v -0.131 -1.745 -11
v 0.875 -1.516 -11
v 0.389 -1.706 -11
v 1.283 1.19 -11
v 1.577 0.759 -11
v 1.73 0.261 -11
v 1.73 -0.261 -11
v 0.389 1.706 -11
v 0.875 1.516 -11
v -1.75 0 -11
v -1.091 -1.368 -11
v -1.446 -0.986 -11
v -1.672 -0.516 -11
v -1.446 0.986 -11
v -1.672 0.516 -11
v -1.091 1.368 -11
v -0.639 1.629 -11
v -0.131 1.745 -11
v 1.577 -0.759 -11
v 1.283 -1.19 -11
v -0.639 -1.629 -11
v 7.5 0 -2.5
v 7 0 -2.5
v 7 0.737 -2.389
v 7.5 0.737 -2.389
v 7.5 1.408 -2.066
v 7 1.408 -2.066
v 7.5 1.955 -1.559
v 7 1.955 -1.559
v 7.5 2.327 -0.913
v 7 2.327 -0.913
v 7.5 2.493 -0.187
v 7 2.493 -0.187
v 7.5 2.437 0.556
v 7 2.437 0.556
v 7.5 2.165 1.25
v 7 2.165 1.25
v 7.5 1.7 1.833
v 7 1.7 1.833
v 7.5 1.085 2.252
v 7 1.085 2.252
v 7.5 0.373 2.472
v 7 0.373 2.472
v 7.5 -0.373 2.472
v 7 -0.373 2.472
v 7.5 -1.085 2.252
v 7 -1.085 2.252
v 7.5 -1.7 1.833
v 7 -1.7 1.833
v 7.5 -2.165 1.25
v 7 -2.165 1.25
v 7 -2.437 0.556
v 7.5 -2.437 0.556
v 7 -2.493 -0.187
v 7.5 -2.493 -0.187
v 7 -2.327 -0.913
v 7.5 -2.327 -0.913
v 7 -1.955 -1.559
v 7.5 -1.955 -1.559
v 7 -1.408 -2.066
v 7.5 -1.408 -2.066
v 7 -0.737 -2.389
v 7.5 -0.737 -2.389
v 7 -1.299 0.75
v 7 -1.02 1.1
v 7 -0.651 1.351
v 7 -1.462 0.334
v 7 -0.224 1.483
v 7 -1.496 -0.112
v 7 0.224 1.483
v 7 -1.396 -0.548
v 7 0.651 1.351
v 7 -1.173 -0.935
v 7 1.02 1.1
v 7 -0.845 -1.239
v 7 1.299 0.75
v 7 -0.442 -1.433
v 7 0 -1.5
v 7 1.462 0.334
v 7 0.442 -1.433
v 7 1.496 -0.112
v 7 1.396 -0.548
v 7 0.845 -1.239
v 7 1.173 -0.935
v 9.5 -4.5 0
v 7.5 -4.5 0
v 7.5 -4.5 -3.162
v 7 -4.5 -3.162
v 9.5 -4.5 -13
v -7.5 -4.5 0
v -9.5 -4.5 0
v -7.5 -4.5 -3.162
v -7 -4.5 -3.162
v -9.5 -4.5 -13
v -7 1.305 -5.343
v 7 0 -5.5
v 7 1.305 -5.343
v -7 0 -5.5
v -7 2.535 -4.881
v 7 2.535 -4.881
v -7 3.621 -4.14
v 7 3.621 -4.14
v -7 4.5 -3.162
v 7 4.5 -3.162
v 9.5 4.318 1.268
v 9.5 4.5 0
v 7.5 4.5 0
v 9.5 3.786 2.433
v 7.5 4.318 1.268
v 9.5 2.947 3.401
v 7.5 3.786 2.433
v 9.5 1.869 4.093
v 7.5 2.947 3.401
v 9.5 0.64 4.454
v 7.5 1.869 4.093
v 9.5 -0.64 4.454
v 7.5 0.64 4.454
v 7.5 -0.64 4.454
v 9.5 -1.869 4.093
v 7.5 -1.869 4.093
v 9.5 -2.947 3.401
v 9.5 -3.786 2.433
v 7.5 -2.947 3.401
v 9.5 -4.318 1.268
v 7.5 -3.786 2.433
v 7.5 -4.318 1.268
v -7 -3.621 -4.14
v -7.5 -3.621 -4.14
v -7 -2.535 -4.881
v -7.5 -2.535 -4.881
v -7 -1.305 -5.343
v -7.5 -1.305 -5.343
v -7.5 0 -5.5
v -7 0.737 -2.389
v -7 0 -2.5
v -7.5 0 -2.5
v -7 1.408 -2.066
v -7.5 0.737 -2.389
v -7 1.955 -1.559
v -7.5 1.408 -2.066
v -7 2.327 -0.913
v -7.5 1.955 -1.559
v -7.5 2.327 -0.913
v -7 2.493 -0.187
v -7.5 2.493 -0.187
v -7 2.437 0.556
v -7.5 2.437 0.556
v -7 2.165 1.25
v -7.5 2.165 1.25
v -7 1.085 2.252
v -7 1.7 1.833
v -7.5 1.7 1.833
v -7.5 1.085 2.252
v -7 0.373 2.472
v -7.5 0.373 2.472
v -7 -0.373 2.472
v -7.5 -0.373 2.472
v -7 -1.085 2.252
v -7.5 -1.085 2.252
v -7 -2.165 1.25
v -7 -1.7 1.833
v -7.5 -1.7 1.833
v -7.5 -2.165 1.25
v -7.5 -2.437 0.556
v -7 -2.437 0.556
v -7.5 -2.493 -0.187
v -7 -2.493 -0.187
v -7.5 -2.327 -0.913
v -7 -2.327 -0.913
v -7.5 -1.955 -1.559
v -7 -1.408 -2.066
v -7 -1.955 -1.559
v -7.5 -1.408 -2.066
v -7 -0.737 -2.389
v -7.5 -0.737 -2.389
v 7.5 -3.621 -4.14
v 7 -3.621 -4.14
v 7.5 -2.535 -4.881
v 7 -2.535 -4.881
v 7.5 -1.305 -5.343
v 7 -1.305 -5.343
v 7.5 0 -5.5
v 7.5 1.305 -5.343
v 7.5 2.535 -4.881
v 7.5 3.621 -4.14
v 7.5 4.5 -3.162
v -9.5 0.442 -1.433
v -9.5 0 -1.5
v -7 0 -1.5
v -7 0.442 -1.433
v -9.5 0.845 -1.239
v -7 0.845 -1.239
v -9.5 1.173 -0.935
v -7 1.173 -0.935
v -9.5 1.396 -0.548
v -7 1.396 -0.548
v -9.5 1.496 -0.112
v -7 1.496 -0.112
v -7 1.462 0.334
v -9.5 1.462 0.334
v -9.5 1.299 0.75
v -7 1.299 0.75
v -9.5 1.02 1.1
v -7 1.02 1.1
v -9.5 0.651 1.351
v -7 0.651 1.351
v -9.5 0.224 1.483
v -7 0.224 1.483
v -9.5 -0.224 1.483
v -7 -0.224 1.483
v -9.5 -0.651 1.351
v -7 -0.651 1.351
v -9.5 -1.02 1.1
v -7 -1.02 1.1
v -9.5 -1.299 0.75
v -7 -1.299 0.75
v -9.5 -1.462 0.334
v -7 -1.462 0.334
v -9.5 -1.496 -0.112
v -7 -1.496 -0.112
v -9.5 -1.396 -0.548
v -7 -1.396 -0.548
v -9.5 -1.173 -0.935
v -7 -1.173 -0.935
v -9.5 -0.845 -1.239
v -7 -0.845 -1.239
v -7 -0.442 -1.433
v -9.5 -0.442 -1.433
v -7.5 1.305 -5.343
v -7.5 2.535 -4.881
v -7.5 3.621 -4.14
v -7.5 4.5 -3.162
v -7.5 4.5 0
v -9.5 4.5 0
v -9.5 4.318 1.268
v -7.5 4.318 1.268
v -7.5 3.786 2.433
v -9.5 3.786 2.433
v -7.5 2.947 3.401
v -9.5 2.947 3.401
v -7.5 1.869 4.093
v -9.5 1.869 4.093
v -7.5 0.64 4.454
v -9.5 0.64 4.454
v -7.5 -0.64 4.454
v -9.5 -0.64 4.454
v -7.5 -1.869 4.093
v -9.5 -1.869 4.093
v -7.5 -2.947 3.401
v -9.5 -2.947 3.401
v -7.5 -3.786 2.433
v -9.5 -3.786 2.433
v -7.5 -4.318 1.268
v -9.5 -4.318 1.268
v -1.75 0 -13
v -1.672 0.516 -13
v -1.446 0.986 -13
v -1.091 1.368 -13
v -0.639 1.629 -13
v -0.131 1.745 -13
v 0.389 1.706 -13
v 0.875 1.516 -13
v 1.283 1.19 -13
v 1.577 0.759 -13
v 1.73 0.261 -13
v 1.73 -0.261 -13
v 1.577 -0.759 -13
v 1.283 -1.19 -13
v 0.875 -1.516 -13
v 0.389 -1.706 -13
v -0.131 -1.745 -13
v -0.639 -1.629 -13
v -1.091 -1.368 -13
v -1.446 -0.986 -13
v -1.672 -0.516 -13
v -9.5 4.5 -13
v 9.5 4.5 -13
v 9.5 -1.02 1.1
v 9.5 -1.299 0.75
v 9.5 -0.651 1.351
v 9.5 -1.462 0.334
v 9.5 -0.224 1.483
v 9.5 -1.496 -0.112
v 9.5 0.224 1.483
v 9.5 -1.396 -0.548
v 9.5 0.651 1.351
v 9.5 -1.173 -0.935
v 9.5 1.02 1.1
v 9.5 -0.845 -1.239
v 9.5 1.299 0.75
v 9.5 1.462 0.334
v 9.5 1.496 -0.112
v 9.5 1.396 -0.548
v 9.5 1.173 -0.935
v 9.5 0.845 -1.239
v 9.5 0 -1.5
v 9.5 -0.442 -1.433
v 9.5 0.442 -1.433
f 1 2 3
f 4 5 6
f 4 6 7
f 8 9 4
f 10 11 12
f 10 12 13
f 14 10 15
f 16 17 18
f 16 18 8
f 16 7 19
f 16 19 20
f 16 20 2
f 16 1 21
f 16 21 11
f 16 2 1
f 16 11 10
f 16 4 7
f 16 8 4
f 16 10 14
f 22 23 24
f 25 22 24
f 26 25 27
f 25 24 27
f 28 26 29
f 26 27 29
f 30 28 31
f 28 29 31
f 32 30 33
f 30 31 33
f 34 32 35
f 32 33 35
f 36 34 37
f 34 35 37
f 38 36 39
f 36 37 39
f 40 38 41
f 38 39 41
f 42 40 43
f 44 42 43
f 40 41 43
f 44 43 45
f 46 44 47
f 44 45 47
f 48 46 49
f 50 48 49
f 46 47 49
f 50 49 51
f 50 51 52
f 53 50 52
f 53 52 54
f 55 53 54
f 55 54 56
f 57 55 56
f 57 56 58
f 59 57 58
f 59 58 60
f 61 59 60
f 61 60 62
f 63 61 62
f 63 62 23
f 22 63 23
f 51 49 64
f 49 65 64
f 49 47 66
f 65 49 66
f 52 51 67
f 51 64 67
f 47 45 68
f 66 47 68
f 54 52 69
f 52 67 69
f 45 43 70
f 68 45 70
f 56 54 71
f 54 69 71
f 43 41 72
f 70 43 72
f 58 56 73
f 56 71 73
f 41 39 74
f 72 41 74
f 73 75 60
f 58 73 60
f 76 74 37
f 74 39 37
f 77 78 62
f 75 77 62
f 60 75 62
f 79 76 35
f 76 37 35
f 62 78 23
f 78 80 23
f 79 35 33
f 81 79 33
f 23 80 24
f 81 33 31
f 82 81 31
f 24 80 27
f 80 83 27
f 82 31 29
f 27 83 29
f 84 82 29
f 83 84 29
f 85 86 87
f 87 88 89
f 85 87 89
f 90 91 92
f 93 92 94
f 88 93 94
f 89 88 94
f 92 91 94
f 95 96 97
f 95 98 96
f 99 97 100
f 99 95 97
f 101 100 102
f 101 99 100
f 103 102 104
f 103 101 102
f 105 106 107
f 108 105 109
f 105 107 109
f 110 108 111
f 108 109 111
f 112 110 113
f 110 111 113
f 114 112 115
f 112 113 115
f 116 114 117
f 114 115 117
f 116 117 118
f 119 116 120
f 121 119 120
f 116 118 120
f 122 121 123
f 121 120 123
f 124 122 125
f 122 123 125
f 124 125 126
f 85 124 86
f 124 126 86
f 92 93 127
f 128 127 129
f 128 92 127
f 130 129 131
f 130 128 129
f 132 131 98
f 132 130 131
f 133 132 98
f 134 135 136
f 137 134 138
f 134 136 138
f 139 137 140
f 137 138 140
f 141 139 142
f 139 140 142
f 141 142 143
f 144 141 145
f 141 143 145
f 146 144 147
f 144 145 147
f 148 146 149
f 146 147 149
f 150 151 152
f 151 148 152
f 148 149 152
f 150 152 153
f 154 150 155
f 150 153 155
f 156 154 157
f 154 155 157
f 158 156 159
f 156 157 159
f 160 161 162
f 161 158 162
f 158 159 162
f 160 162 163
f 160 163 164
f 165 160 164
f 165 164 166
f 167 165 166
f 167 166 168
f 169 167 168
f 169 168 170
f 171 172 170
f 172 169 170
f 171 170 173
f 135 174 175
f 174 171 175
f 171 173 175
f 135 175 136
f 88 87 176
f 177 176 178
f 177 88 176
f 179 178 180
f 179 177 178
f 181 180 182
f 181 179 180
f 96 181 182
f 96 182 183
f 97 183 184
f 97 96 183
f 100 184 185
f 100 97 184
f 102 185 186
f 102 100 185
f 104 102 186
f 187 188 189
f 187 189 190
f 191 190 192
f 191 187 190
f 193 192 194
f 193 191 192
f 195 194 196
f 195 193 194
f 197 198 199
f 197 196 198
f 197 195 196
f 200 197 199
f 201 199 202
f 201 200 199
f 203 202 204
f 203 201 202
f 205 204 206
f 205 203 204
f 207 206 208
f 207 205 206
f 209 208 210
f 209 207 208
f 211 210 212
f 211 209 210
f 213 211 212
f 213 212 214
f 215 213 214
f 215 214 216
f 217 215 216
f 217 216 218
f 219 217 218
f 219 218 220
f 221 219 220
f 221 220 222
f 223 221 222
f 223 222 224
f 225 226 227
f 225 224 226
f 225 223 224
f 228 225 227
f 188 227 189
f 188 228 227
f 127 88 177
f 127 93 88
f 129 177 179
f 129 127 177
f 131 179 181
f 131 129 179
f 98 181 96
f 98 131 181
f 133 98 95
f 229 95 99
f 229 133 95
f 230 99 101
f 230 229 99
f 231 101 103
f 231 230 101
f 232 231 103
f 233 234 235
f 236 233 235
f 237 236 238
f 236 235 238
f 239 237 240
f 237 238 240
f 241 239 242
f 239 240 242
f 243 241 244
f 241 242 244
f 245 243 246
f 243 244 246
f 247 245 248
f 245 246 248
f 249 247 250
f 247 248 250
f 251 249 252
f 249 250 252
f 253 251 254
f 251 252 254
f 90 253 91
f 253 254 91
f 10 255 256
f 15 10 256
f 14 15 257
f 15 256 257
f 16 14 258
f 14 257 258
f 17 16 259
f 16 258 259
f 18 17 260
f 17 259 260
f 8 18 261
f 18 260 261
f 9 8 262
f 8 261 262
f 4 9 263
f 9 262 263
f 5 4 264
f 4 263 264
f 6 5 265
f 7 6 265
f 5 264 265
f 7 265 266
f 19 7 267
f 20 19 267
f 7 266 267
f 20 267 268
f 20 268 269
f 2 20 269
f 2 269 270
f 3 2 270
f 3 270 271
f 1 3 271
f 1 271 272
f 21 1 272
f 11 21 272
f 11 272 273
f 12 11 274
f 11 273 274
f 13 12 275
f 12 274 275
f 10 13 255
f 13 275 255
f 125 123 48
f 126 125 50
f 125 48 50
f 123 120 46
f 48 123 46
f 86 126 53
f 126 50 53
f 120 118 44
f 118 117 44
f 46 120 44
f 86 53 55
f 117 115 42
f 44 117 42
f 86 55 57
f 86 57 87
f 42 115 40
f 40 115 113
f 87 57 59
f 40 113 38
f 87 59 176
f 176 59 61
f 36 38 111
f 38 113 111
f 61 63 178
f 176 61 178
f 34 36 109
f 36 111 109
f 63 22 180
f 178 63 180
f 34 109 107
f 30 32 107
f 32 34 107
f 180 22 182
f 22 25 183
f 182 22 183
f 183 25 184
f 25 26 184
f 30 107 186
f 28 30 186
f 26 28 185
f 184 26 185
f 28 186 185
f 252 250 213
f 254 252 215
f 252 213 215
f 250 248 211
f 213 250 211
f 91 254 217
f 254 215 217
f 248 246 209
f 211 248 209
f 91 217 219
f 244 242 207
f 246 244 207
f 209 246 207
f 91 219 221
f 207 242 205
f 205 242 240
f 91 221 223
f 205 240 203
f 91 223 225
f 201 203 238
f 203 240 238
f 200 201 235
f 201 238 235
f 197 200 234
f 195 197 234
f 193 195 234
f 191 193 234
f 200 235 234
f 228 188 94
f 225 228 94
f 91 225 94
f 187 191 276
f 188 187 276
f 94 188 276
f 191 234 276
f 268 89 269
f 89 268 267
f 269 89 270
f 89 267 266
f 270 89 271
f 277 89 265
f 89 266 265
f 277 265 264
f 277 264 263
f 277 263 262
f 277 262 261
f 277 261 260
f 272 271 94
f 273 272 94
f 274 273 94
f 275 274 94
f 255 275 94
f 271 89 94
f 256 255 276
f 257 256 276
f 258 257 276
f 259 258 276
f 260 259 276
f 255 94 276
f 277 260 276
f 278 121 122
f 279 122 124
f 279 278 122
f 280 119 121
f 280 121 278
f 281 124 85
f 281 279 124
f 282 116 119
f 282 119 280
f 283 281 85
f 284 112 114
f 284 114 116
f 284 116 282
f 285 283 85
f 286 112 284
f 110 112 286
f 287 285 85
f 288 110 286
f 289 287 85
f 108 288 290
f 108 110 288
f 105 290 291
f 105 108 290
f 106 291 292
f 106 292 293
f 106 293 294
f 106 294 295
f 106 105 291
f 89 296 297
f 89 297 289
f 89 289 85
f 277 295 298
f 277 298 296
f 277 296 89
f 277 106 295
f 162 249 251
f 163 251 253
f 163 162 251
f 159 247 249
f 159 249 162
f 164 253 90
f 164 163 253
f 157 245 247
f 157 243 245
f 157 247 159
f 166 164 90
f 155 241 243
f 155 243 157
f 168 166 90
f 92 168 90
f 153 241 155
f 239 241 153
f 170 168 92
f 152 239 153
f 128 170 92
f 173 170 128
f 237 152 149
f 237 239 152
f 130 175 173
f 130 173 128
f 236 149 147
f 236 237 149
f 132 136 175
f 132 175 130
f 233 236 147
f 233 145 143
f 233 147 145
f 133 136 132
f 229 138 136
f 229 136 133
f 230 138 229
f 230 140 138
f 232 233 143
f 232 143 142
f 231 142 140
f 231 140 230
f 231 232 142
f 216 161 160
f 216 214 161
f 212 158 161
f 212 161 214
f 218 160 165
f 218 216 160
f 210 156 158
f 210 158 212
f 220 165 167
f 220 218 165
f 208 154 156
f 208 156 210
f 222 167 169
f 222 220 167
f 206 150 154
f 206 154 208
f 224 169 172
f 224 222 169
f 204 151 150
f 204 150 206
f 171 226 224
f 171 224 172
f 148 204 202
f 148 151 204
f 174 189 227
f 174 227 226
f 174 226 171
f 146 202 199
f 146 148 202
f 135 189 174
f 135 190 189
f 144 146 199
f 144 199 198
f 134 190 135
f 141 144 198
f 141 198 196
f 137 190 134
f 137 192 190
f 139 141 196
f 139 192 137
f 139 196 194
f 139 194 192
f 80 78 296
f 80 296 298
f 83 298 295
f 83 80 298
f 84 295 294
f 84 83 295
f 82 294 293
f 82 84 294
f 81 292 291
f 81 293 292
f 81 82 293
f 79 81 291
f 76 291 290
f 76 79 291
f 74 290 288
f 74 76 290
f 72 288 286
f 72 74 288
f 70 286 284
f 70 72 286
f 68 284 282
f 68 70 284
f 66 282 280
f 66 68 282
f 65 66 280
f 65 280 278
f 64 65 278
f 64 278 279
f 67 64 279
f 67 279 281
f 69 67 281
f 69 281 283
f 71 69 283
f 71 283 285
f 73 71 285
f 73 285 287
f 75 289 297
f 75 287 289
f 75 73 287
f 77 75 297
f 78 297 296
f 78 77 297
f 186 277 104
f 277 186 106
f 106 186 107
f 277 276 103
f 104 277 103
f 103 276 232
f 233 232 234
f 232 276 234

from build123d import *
from build123d.topology import SkipClean

# Parameters (mm, degrees)
EXTRUDE_1_DEPTH          = 9.5
EXTRUDE_1_DEPTH_BACK     = 9.5
CUT_EXTRUDE_1_DEPTH      = 7
CUT_EXTRUDE_1_DEPTH_BACK = 7
SKETCH_2_R               = 5.5
CUT_EXTRUDE_2_DEPTH      = 17.718253497
CUT_EXTRUDE_2_DEPTH_BACK = 17.718253497
SKETCH_3_R               = 1.5
CUT_EXTRUDE_3_DEPTH      = 7.5
CUT_EXTRUDE_3_DEPTH_BACK = 7.5
SKETCH_4_R               = 5.5
SKETCH_4_R_2             = 2.5
SKETCH_5_R               = 1.75
CUT_EXTRUDE_4_DEPTH      = 2


with BuildPart() as part:
    # Эскиз1 → Бобышка-Вытянуть1 (new, two sides: drawn at the far end of the back side and taken through both)
    with BuildSketch(Plane(origin=(0, 0, 0), x_dir=(0, 0, -1), z_dir=(1, 0, 0)).offset(-EXTRUDE_1_DEPTH_BACK)):
        with BuildLine():
            Line((13, 4.5), (0, 4.5))
            ThreePointArc((0, 4.5), (-4.5, 0), (0, -4.5))
            Line((0, -4.5), (13, -4.5))
            Line((13, -4.5), (13, 4.5))
        make_face()
    extrude(amount=EXTRUDE_1_DEPTH + EXTRUDE_1_DEPTH_BACK)

    # Эскиз2 → Вырез-Вытянуть1 (cut, two sides: drawn at the far end of the back side and taken through both)
    with BuildSketch(Plane(origin=(0, 0, 0), x_dir=(0, 0, -1), z_dir=(1, 0, 0)).offset(-CUT_EXTRUDE_1_DEPTH_BACK)):
        Circle(SKETCH_2_R)
    extrude(amount=CUT_EXTRUDE_1_DEPTH + CUT_EXTRUDE_1_DEPTH_BACK, mode=Mode.SUBTRACT)

    # Эскиз3 → Вырез-Вытянуть2 (cut, two sides: drawn at the far end of the back side and taken through both)
    with BuildSketch(Plane(origin=(0, 0, 0), x_dir=(0, 0, -1), z_dir=(1, 0, 0)).offset(-CUT_EXTRUDE_2_DEPTH_BACK)):
        Circle(SKETCH_3_R)
    extrude(amount=CUT_EXTRUDE_2_DEPTH + CUT_EXTRUDE_2_DEPTH_BACK, mode=Mode.SUBTRACT)

    # Эскиз4 → Вырез-Вытянуть3 (cut, two sides: drawn at the far end of the back side and taken through both)
    with SkipClean():  # the faces are left unmerged after this step: merging them gives an invalid solid
        with BuildSketch(Plane(origin=(0, 0, 0), x_dir=(0, 0, -1), z_dir=(1, 0, 0)).offset(-CUT_EXTRUDE_3_DEPTH_BACK)):
            Circle(SKETCH_4_R)
            Circle(SKETCH_4_R_2, mode=Mode.SUBTRACT)
        extrude(amount=CUT_EXTRUDE_3_DEPTH + CUT_EXTRUDE_3_DEPTH_BACK, mode=Mode.SUBTRACT)
    add(part.part.scale(1), mode=Mode.REPLACE)  # the faces are merged on a copy

    # Эскиз5 → Вырез-Вытянуть4 (cut)
    with BuildSketch(Plane(origin=(0, 0, -13), x_dir=(-1, 0, 0), z_dir=(0, 0, -1))):
        Circle(SKETCH_5_R)
    extrude(amount=-CUT_EXTRUDE_4_DEPTH, mode=Mode.SUBTRACT)


solid = part.part
